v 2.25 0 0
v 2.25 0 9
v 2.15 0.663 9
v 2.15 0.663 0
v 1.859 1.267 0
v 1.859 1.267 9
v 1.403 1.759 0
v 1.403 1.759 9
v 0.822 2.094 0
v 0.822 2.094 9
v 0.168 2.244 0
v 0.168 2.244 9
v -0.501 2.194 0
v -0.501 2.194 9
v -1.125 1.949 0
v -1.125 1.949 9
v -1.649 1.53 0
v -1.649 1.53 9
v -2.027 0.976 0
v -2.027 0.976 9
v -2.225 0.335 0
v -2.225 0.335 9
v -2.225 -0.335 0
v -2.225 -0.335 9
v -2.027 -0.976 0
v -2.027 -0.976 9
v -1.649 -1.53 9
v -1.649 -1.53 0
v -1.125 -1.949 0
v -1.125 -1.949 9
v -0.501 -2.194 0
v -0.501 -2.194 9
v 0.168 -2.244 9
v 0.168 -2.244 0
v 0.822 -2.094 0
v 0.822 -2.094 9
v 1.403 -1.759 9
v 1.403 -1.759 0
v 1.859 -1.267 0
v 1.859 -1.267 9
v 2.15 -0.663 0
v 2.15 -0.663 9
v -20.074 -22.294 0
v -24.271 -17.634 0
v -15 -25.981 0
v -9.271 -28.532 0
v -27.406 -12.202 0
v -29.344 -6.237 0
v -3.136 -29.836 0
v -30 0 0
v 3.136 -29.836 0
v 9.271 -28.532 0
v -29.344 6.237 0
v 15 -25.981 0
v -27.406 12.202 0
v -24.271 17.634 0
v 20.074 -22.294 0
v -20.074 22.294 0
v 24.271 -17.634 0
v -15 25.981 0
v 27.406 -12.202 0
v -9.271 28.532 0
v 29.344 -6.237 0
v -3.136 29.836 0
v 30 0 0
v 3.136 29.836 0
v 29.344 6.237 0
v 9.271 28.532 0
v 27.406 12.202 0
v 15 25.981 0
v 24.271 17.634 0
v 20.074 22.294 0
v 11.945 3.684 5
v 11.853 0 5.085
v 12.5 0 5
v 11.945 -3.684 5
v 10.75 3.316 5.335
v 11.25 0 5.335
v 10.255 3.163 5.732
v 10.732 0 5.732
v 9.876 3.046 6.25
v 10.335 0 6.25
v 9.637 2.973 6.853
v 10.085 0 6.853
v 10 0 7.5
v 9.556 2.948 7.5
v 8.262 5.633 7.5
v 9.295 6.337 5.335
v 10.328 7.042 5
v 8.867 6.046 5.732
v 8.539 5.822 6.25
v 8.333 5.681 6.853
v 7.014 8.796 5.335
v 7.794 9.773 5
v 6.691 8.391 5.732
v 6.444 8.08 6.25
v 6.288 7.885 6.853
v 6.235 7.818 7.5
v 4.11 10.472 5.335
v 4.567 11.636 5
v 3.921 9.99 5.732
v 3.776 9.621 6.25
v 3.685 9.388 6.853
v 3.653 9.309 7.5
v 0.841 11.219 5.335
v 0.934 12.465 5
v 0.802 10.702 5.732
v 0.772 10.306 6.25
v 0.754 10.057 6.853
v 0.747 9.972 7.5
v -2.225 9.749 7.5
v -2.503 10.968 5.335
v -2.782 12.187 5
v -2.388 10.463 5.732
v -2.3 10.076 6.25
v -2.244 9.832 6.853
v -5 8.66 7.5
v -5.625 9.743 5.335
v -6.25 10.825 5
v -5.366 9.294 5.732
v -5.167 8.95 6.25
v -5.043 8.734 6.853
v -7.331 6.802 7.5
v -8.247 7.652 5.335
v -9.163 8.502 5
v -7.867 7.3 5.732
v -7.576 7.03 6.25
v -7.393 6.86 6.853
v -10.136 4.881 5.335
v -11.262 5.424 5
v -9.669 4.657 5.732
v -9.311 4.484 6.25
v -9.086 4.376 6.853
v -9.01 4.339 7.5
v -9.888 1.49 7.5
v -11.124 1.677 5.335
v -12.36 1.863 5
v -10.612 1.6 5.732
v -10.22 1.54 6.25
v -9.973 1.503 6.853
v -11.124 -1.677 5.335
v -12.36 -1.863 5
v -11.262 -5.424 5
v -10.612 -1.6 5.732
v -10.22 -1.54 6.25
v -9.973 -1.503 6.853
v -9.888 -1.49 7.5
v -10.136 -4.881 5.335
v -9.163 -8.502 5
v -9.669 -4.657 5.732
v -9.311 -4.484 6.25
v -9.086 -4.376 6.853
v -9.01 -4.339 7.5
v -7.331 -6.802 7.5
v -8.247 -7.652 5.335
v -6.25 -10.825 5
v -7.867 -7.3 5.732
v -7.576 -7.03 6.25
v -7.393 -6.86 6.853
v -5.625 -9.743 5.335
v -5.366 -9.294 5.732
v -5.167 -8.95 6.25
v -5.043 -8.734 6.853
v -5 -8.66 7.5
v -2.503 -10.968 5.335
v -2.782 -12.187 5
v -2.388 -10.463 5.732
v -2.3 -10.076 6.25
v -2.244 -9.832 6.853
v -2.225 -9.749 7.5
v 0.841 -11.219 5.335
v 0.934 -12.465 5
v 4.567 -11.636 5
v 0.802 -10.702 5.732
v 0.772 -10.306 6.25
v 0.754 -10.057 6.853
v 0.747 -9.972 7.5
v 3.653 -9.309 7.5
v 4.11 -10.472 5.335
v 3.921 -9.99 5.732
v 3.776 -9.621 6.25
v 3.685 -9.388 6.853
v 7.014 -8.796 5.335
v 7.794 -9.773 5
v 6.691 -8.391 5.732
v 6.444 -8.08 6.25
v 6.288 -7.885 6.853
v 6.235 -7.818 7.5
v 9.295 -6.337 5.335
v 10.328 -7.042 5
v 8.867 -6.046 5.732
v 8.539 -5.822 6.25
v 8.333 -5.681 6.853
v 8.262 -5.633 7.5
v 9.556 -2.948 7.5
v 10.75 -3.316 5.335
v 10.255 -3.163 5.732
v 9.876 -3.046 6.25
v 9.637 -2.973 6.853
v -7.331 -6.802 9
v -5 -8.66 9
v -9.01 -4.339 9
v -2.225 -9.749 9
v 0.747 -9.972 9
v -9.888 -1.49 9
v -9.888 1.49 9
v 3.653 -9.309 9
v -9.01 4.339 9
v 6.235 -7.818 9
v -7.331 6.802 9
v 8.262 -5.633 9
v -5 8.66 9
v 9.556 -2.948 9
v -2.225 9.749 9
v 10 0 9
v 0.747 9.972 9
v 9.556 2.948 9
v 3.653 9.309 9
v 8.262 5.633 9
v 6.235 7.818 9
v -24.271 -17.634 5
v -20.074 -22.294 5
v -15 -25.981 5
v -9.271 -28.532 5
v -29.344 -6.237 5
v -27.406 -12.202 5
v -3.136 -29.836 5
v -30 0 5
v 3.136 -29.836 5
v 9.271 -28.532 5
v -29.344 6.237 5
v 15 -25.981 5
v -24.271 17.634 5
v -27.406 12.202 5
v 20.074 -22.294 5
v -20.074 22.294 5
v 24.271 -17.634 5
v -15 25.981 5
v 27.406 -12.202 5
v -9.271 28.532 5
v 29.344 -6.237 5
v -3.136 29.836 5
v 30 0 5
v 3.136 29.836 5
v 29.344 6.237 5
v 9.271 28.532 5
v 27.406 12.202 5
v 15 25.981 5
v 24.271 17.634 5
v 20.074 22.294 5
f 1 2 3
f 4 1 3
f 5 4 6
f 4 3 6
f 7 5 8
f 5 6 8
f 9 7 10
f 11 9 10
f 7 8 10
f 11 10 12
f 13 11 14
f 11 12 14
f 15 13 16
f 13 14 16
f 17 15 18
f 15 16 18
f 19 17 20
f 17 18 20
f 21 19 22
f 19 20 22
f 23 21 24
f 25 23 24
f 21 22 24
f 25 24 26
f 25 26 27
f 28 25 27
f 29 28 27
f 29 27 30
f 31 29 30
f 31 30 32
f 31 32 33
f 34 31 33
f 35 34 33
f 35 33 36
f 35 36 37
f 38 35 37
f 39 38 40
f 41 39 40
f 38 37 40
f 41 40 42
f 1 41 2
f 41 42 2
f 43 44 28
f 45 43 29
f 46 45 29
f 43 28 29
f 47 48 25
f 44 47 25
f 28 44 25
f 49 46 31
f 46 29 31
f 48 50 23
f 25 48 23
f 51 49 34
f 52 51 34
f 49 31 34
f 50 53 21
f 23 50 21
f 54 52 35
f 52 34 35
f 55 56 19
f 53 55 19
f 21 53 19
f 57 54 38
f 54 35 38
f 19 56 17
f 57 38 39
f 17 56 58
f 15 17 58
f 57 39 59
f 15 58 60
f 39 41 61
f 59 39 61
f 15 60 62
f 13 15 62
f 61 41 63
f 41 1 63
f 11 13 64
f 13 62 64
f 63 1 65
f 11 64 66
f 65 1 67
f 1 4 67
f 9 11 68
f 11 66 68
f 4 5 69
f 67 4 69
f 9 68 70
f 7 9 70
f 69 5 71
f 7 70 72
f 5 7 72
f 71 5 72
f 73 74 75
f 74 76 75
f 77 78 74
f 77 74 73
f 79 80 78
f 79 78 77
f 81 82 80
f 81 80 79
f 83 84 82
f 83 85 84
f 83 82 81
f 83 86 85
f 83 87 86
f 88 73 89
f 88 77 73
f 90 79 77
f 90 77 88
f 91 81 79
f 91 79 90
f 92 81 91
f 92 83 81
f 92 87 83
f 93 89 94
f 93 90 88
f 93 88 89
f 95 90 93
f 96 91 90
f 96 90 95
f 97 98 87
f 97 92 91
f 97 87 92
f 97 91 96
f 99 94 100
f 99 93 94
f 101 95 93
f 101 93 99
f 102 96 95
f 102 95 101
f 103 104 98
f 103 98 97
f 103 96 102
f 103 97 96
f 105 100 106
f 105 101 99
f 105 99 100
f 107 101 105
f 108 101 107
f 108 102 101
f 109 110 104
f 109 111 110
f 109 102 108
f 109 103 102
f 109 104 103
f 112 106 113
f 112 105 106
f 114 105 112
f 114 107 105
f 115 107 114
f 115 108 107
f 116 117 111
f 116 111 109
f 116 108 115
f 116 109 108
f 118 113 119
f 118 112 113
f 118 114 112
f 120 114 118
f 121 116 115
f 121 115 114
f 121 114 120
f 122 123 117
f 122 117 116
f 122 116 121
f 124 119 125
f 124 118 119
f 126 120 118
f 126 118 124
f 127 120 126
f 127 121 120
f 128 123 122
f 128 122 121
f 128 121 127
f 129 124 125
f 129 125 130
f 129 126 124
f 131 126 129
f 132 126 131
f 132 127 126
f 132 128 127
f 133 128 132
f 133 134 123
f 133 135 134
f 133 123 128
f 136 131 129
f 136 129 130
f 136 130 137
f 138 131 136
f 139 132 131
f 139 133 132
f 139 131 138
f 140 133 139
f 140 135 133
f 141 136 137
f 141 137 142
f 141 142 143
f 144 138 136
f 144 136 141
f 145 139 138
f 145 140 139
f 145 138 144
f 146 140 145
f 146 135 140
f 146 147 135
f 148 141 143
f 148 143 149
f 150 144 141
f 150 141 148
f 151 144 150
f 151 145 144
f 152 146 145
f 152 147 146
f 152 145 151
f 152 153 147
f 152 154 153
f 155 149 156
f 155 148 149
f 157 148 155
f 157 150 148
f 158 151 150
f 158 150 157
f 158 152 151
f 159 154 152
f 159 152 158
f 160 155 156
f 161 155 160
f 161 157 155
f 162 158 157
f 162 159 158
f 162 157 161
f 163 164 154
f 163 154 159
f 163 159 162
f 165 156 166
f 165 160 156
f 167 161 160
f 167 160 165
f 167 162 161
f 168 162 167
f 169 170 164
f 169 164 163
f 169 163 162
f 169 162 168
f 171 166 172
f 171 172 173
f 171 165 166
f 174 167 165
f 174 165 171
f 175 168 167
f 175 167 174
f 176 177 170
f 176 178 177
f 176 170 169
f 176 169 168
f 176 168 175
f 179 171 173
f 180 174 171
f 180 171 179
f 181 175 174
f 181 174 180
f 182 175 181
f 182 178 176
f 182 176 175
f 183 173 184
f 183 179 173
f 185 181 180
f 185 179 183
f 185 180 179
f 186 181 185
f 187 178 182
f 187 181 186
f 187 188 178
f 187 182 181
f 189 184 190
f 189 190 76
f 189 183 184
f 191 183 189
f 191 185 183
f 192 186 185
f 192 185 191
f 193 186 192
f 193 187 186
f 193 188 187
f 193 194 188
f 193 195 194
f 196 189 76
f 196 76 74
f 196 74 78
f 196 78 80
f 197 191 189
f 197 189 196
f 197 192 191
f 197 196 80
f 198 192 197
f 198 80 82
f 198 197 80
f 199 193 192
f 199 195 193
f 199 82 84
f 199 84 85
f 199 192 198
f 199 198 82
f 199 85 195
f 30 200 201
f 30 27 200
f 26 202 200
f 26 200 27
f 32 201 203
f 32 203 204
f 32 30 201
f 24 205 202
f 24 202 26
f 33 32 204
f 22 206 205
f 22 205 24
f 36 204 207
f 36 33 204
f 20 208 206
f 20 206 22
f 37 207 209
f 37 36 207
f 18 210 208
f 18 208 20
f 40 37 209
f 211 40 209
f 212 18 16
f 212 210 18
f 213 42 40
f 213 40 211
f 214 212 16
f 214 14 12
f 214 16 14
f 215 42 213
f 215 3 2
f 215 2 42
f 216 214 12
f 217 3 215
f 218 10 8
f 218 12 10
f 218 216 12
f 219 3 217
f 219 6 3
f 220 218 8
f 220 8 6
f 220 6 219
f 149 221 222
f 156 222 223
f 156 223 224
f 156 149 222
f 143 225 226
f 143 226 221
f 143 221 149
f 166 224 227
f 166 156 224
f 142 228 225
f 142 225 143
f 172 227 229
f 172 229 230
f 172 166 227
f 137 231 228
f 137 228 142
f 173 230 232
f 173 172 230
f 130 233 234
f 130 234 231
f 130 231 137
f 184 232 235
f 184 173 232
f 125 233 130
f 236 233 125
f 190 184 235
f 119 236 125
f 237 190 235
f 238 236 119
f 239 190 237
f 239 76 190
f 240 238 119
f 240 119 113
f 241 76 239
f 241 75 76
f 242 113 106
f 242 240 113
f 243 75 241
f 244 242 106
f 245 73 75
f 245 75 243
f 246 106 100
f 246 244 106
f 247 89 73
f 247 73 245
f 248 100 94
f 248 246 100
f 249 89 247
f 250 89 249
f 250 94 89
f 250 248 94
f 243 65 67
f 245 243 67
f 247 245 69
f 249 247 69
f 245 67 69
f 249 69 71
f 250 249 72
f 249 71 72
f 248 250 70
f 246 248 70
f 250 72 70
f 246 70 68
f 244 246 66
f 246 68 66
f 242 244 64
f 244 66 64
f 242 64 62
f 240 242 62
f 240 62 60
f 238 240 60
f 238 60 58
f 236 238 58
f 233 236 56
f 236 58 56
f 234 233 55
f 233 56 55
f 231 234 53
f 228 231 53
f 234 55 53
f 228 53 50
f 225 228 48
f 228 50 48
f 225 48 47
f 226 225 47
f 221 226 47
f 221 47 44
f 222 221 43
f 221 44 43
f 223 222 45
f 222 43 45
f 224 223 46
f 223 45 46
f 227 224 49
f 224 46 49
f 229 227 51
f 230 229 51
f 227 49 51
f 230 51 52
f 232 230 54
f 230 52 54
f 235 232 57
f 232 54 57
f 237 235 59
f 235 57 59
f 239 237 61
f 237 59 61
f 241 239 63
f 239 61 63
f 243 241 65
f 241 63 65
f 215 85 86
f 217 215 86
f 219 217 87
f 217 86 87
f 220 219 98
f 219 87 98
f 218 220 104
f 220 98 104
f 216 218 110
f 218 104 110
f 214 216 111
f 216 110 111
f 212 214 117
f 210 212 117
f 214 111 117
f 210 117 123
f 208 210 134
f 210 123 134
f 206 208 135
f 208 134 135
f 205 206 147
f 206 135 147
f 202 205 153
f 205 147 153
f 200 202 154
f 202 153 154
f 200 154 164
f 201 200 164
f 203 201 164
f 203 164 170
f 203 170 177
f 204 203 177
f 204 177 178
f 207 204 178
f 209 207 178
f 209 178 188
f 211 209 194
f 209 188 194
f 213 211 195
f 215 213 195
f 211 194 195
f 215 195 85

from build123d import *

# Parameters (mm, degrees)
SKETCH_R     = 30
PAD_DEPTH    = 5
SKETCH001_R  = 10
PAD001_DEPTH = 4
SKETCH002_R  = 2.25
POCKET_DEPTH = 9
FILLET_R     = 2.5


with BuildPart() as part:
    # Sketch → Pad (new body)
    with BuildSketch(Plane.XY):
        Circle(SKETCH_R)
    extrude(amount=PAD_DEPTH)

    # Sketch001 (on Face3 of Pad) → Pad001 (join)
    with BuildSketch(Plane.XY.offset(5)):
        Circle(SKETCH001_R)
    extrude(amount=PAD001_DEPTH)

    # Sketch002 (on Face5 of Pad001) → Pocket (cut)
    with BuildSketch(Plane.XY.offset(9)):
        Circle(SKETCH002_R)
    extrude(amount=-POCKET_DEPTH, mode=Mode.SUBTRACT)

    # Fillet
    fillet_edges = [part.edges().sort_by_distance(p)[0] for p in [
        (-10, 0, 5),
    ]]
    fillet(fillet_edges, radius=FILLET_R)


solid = part.part
